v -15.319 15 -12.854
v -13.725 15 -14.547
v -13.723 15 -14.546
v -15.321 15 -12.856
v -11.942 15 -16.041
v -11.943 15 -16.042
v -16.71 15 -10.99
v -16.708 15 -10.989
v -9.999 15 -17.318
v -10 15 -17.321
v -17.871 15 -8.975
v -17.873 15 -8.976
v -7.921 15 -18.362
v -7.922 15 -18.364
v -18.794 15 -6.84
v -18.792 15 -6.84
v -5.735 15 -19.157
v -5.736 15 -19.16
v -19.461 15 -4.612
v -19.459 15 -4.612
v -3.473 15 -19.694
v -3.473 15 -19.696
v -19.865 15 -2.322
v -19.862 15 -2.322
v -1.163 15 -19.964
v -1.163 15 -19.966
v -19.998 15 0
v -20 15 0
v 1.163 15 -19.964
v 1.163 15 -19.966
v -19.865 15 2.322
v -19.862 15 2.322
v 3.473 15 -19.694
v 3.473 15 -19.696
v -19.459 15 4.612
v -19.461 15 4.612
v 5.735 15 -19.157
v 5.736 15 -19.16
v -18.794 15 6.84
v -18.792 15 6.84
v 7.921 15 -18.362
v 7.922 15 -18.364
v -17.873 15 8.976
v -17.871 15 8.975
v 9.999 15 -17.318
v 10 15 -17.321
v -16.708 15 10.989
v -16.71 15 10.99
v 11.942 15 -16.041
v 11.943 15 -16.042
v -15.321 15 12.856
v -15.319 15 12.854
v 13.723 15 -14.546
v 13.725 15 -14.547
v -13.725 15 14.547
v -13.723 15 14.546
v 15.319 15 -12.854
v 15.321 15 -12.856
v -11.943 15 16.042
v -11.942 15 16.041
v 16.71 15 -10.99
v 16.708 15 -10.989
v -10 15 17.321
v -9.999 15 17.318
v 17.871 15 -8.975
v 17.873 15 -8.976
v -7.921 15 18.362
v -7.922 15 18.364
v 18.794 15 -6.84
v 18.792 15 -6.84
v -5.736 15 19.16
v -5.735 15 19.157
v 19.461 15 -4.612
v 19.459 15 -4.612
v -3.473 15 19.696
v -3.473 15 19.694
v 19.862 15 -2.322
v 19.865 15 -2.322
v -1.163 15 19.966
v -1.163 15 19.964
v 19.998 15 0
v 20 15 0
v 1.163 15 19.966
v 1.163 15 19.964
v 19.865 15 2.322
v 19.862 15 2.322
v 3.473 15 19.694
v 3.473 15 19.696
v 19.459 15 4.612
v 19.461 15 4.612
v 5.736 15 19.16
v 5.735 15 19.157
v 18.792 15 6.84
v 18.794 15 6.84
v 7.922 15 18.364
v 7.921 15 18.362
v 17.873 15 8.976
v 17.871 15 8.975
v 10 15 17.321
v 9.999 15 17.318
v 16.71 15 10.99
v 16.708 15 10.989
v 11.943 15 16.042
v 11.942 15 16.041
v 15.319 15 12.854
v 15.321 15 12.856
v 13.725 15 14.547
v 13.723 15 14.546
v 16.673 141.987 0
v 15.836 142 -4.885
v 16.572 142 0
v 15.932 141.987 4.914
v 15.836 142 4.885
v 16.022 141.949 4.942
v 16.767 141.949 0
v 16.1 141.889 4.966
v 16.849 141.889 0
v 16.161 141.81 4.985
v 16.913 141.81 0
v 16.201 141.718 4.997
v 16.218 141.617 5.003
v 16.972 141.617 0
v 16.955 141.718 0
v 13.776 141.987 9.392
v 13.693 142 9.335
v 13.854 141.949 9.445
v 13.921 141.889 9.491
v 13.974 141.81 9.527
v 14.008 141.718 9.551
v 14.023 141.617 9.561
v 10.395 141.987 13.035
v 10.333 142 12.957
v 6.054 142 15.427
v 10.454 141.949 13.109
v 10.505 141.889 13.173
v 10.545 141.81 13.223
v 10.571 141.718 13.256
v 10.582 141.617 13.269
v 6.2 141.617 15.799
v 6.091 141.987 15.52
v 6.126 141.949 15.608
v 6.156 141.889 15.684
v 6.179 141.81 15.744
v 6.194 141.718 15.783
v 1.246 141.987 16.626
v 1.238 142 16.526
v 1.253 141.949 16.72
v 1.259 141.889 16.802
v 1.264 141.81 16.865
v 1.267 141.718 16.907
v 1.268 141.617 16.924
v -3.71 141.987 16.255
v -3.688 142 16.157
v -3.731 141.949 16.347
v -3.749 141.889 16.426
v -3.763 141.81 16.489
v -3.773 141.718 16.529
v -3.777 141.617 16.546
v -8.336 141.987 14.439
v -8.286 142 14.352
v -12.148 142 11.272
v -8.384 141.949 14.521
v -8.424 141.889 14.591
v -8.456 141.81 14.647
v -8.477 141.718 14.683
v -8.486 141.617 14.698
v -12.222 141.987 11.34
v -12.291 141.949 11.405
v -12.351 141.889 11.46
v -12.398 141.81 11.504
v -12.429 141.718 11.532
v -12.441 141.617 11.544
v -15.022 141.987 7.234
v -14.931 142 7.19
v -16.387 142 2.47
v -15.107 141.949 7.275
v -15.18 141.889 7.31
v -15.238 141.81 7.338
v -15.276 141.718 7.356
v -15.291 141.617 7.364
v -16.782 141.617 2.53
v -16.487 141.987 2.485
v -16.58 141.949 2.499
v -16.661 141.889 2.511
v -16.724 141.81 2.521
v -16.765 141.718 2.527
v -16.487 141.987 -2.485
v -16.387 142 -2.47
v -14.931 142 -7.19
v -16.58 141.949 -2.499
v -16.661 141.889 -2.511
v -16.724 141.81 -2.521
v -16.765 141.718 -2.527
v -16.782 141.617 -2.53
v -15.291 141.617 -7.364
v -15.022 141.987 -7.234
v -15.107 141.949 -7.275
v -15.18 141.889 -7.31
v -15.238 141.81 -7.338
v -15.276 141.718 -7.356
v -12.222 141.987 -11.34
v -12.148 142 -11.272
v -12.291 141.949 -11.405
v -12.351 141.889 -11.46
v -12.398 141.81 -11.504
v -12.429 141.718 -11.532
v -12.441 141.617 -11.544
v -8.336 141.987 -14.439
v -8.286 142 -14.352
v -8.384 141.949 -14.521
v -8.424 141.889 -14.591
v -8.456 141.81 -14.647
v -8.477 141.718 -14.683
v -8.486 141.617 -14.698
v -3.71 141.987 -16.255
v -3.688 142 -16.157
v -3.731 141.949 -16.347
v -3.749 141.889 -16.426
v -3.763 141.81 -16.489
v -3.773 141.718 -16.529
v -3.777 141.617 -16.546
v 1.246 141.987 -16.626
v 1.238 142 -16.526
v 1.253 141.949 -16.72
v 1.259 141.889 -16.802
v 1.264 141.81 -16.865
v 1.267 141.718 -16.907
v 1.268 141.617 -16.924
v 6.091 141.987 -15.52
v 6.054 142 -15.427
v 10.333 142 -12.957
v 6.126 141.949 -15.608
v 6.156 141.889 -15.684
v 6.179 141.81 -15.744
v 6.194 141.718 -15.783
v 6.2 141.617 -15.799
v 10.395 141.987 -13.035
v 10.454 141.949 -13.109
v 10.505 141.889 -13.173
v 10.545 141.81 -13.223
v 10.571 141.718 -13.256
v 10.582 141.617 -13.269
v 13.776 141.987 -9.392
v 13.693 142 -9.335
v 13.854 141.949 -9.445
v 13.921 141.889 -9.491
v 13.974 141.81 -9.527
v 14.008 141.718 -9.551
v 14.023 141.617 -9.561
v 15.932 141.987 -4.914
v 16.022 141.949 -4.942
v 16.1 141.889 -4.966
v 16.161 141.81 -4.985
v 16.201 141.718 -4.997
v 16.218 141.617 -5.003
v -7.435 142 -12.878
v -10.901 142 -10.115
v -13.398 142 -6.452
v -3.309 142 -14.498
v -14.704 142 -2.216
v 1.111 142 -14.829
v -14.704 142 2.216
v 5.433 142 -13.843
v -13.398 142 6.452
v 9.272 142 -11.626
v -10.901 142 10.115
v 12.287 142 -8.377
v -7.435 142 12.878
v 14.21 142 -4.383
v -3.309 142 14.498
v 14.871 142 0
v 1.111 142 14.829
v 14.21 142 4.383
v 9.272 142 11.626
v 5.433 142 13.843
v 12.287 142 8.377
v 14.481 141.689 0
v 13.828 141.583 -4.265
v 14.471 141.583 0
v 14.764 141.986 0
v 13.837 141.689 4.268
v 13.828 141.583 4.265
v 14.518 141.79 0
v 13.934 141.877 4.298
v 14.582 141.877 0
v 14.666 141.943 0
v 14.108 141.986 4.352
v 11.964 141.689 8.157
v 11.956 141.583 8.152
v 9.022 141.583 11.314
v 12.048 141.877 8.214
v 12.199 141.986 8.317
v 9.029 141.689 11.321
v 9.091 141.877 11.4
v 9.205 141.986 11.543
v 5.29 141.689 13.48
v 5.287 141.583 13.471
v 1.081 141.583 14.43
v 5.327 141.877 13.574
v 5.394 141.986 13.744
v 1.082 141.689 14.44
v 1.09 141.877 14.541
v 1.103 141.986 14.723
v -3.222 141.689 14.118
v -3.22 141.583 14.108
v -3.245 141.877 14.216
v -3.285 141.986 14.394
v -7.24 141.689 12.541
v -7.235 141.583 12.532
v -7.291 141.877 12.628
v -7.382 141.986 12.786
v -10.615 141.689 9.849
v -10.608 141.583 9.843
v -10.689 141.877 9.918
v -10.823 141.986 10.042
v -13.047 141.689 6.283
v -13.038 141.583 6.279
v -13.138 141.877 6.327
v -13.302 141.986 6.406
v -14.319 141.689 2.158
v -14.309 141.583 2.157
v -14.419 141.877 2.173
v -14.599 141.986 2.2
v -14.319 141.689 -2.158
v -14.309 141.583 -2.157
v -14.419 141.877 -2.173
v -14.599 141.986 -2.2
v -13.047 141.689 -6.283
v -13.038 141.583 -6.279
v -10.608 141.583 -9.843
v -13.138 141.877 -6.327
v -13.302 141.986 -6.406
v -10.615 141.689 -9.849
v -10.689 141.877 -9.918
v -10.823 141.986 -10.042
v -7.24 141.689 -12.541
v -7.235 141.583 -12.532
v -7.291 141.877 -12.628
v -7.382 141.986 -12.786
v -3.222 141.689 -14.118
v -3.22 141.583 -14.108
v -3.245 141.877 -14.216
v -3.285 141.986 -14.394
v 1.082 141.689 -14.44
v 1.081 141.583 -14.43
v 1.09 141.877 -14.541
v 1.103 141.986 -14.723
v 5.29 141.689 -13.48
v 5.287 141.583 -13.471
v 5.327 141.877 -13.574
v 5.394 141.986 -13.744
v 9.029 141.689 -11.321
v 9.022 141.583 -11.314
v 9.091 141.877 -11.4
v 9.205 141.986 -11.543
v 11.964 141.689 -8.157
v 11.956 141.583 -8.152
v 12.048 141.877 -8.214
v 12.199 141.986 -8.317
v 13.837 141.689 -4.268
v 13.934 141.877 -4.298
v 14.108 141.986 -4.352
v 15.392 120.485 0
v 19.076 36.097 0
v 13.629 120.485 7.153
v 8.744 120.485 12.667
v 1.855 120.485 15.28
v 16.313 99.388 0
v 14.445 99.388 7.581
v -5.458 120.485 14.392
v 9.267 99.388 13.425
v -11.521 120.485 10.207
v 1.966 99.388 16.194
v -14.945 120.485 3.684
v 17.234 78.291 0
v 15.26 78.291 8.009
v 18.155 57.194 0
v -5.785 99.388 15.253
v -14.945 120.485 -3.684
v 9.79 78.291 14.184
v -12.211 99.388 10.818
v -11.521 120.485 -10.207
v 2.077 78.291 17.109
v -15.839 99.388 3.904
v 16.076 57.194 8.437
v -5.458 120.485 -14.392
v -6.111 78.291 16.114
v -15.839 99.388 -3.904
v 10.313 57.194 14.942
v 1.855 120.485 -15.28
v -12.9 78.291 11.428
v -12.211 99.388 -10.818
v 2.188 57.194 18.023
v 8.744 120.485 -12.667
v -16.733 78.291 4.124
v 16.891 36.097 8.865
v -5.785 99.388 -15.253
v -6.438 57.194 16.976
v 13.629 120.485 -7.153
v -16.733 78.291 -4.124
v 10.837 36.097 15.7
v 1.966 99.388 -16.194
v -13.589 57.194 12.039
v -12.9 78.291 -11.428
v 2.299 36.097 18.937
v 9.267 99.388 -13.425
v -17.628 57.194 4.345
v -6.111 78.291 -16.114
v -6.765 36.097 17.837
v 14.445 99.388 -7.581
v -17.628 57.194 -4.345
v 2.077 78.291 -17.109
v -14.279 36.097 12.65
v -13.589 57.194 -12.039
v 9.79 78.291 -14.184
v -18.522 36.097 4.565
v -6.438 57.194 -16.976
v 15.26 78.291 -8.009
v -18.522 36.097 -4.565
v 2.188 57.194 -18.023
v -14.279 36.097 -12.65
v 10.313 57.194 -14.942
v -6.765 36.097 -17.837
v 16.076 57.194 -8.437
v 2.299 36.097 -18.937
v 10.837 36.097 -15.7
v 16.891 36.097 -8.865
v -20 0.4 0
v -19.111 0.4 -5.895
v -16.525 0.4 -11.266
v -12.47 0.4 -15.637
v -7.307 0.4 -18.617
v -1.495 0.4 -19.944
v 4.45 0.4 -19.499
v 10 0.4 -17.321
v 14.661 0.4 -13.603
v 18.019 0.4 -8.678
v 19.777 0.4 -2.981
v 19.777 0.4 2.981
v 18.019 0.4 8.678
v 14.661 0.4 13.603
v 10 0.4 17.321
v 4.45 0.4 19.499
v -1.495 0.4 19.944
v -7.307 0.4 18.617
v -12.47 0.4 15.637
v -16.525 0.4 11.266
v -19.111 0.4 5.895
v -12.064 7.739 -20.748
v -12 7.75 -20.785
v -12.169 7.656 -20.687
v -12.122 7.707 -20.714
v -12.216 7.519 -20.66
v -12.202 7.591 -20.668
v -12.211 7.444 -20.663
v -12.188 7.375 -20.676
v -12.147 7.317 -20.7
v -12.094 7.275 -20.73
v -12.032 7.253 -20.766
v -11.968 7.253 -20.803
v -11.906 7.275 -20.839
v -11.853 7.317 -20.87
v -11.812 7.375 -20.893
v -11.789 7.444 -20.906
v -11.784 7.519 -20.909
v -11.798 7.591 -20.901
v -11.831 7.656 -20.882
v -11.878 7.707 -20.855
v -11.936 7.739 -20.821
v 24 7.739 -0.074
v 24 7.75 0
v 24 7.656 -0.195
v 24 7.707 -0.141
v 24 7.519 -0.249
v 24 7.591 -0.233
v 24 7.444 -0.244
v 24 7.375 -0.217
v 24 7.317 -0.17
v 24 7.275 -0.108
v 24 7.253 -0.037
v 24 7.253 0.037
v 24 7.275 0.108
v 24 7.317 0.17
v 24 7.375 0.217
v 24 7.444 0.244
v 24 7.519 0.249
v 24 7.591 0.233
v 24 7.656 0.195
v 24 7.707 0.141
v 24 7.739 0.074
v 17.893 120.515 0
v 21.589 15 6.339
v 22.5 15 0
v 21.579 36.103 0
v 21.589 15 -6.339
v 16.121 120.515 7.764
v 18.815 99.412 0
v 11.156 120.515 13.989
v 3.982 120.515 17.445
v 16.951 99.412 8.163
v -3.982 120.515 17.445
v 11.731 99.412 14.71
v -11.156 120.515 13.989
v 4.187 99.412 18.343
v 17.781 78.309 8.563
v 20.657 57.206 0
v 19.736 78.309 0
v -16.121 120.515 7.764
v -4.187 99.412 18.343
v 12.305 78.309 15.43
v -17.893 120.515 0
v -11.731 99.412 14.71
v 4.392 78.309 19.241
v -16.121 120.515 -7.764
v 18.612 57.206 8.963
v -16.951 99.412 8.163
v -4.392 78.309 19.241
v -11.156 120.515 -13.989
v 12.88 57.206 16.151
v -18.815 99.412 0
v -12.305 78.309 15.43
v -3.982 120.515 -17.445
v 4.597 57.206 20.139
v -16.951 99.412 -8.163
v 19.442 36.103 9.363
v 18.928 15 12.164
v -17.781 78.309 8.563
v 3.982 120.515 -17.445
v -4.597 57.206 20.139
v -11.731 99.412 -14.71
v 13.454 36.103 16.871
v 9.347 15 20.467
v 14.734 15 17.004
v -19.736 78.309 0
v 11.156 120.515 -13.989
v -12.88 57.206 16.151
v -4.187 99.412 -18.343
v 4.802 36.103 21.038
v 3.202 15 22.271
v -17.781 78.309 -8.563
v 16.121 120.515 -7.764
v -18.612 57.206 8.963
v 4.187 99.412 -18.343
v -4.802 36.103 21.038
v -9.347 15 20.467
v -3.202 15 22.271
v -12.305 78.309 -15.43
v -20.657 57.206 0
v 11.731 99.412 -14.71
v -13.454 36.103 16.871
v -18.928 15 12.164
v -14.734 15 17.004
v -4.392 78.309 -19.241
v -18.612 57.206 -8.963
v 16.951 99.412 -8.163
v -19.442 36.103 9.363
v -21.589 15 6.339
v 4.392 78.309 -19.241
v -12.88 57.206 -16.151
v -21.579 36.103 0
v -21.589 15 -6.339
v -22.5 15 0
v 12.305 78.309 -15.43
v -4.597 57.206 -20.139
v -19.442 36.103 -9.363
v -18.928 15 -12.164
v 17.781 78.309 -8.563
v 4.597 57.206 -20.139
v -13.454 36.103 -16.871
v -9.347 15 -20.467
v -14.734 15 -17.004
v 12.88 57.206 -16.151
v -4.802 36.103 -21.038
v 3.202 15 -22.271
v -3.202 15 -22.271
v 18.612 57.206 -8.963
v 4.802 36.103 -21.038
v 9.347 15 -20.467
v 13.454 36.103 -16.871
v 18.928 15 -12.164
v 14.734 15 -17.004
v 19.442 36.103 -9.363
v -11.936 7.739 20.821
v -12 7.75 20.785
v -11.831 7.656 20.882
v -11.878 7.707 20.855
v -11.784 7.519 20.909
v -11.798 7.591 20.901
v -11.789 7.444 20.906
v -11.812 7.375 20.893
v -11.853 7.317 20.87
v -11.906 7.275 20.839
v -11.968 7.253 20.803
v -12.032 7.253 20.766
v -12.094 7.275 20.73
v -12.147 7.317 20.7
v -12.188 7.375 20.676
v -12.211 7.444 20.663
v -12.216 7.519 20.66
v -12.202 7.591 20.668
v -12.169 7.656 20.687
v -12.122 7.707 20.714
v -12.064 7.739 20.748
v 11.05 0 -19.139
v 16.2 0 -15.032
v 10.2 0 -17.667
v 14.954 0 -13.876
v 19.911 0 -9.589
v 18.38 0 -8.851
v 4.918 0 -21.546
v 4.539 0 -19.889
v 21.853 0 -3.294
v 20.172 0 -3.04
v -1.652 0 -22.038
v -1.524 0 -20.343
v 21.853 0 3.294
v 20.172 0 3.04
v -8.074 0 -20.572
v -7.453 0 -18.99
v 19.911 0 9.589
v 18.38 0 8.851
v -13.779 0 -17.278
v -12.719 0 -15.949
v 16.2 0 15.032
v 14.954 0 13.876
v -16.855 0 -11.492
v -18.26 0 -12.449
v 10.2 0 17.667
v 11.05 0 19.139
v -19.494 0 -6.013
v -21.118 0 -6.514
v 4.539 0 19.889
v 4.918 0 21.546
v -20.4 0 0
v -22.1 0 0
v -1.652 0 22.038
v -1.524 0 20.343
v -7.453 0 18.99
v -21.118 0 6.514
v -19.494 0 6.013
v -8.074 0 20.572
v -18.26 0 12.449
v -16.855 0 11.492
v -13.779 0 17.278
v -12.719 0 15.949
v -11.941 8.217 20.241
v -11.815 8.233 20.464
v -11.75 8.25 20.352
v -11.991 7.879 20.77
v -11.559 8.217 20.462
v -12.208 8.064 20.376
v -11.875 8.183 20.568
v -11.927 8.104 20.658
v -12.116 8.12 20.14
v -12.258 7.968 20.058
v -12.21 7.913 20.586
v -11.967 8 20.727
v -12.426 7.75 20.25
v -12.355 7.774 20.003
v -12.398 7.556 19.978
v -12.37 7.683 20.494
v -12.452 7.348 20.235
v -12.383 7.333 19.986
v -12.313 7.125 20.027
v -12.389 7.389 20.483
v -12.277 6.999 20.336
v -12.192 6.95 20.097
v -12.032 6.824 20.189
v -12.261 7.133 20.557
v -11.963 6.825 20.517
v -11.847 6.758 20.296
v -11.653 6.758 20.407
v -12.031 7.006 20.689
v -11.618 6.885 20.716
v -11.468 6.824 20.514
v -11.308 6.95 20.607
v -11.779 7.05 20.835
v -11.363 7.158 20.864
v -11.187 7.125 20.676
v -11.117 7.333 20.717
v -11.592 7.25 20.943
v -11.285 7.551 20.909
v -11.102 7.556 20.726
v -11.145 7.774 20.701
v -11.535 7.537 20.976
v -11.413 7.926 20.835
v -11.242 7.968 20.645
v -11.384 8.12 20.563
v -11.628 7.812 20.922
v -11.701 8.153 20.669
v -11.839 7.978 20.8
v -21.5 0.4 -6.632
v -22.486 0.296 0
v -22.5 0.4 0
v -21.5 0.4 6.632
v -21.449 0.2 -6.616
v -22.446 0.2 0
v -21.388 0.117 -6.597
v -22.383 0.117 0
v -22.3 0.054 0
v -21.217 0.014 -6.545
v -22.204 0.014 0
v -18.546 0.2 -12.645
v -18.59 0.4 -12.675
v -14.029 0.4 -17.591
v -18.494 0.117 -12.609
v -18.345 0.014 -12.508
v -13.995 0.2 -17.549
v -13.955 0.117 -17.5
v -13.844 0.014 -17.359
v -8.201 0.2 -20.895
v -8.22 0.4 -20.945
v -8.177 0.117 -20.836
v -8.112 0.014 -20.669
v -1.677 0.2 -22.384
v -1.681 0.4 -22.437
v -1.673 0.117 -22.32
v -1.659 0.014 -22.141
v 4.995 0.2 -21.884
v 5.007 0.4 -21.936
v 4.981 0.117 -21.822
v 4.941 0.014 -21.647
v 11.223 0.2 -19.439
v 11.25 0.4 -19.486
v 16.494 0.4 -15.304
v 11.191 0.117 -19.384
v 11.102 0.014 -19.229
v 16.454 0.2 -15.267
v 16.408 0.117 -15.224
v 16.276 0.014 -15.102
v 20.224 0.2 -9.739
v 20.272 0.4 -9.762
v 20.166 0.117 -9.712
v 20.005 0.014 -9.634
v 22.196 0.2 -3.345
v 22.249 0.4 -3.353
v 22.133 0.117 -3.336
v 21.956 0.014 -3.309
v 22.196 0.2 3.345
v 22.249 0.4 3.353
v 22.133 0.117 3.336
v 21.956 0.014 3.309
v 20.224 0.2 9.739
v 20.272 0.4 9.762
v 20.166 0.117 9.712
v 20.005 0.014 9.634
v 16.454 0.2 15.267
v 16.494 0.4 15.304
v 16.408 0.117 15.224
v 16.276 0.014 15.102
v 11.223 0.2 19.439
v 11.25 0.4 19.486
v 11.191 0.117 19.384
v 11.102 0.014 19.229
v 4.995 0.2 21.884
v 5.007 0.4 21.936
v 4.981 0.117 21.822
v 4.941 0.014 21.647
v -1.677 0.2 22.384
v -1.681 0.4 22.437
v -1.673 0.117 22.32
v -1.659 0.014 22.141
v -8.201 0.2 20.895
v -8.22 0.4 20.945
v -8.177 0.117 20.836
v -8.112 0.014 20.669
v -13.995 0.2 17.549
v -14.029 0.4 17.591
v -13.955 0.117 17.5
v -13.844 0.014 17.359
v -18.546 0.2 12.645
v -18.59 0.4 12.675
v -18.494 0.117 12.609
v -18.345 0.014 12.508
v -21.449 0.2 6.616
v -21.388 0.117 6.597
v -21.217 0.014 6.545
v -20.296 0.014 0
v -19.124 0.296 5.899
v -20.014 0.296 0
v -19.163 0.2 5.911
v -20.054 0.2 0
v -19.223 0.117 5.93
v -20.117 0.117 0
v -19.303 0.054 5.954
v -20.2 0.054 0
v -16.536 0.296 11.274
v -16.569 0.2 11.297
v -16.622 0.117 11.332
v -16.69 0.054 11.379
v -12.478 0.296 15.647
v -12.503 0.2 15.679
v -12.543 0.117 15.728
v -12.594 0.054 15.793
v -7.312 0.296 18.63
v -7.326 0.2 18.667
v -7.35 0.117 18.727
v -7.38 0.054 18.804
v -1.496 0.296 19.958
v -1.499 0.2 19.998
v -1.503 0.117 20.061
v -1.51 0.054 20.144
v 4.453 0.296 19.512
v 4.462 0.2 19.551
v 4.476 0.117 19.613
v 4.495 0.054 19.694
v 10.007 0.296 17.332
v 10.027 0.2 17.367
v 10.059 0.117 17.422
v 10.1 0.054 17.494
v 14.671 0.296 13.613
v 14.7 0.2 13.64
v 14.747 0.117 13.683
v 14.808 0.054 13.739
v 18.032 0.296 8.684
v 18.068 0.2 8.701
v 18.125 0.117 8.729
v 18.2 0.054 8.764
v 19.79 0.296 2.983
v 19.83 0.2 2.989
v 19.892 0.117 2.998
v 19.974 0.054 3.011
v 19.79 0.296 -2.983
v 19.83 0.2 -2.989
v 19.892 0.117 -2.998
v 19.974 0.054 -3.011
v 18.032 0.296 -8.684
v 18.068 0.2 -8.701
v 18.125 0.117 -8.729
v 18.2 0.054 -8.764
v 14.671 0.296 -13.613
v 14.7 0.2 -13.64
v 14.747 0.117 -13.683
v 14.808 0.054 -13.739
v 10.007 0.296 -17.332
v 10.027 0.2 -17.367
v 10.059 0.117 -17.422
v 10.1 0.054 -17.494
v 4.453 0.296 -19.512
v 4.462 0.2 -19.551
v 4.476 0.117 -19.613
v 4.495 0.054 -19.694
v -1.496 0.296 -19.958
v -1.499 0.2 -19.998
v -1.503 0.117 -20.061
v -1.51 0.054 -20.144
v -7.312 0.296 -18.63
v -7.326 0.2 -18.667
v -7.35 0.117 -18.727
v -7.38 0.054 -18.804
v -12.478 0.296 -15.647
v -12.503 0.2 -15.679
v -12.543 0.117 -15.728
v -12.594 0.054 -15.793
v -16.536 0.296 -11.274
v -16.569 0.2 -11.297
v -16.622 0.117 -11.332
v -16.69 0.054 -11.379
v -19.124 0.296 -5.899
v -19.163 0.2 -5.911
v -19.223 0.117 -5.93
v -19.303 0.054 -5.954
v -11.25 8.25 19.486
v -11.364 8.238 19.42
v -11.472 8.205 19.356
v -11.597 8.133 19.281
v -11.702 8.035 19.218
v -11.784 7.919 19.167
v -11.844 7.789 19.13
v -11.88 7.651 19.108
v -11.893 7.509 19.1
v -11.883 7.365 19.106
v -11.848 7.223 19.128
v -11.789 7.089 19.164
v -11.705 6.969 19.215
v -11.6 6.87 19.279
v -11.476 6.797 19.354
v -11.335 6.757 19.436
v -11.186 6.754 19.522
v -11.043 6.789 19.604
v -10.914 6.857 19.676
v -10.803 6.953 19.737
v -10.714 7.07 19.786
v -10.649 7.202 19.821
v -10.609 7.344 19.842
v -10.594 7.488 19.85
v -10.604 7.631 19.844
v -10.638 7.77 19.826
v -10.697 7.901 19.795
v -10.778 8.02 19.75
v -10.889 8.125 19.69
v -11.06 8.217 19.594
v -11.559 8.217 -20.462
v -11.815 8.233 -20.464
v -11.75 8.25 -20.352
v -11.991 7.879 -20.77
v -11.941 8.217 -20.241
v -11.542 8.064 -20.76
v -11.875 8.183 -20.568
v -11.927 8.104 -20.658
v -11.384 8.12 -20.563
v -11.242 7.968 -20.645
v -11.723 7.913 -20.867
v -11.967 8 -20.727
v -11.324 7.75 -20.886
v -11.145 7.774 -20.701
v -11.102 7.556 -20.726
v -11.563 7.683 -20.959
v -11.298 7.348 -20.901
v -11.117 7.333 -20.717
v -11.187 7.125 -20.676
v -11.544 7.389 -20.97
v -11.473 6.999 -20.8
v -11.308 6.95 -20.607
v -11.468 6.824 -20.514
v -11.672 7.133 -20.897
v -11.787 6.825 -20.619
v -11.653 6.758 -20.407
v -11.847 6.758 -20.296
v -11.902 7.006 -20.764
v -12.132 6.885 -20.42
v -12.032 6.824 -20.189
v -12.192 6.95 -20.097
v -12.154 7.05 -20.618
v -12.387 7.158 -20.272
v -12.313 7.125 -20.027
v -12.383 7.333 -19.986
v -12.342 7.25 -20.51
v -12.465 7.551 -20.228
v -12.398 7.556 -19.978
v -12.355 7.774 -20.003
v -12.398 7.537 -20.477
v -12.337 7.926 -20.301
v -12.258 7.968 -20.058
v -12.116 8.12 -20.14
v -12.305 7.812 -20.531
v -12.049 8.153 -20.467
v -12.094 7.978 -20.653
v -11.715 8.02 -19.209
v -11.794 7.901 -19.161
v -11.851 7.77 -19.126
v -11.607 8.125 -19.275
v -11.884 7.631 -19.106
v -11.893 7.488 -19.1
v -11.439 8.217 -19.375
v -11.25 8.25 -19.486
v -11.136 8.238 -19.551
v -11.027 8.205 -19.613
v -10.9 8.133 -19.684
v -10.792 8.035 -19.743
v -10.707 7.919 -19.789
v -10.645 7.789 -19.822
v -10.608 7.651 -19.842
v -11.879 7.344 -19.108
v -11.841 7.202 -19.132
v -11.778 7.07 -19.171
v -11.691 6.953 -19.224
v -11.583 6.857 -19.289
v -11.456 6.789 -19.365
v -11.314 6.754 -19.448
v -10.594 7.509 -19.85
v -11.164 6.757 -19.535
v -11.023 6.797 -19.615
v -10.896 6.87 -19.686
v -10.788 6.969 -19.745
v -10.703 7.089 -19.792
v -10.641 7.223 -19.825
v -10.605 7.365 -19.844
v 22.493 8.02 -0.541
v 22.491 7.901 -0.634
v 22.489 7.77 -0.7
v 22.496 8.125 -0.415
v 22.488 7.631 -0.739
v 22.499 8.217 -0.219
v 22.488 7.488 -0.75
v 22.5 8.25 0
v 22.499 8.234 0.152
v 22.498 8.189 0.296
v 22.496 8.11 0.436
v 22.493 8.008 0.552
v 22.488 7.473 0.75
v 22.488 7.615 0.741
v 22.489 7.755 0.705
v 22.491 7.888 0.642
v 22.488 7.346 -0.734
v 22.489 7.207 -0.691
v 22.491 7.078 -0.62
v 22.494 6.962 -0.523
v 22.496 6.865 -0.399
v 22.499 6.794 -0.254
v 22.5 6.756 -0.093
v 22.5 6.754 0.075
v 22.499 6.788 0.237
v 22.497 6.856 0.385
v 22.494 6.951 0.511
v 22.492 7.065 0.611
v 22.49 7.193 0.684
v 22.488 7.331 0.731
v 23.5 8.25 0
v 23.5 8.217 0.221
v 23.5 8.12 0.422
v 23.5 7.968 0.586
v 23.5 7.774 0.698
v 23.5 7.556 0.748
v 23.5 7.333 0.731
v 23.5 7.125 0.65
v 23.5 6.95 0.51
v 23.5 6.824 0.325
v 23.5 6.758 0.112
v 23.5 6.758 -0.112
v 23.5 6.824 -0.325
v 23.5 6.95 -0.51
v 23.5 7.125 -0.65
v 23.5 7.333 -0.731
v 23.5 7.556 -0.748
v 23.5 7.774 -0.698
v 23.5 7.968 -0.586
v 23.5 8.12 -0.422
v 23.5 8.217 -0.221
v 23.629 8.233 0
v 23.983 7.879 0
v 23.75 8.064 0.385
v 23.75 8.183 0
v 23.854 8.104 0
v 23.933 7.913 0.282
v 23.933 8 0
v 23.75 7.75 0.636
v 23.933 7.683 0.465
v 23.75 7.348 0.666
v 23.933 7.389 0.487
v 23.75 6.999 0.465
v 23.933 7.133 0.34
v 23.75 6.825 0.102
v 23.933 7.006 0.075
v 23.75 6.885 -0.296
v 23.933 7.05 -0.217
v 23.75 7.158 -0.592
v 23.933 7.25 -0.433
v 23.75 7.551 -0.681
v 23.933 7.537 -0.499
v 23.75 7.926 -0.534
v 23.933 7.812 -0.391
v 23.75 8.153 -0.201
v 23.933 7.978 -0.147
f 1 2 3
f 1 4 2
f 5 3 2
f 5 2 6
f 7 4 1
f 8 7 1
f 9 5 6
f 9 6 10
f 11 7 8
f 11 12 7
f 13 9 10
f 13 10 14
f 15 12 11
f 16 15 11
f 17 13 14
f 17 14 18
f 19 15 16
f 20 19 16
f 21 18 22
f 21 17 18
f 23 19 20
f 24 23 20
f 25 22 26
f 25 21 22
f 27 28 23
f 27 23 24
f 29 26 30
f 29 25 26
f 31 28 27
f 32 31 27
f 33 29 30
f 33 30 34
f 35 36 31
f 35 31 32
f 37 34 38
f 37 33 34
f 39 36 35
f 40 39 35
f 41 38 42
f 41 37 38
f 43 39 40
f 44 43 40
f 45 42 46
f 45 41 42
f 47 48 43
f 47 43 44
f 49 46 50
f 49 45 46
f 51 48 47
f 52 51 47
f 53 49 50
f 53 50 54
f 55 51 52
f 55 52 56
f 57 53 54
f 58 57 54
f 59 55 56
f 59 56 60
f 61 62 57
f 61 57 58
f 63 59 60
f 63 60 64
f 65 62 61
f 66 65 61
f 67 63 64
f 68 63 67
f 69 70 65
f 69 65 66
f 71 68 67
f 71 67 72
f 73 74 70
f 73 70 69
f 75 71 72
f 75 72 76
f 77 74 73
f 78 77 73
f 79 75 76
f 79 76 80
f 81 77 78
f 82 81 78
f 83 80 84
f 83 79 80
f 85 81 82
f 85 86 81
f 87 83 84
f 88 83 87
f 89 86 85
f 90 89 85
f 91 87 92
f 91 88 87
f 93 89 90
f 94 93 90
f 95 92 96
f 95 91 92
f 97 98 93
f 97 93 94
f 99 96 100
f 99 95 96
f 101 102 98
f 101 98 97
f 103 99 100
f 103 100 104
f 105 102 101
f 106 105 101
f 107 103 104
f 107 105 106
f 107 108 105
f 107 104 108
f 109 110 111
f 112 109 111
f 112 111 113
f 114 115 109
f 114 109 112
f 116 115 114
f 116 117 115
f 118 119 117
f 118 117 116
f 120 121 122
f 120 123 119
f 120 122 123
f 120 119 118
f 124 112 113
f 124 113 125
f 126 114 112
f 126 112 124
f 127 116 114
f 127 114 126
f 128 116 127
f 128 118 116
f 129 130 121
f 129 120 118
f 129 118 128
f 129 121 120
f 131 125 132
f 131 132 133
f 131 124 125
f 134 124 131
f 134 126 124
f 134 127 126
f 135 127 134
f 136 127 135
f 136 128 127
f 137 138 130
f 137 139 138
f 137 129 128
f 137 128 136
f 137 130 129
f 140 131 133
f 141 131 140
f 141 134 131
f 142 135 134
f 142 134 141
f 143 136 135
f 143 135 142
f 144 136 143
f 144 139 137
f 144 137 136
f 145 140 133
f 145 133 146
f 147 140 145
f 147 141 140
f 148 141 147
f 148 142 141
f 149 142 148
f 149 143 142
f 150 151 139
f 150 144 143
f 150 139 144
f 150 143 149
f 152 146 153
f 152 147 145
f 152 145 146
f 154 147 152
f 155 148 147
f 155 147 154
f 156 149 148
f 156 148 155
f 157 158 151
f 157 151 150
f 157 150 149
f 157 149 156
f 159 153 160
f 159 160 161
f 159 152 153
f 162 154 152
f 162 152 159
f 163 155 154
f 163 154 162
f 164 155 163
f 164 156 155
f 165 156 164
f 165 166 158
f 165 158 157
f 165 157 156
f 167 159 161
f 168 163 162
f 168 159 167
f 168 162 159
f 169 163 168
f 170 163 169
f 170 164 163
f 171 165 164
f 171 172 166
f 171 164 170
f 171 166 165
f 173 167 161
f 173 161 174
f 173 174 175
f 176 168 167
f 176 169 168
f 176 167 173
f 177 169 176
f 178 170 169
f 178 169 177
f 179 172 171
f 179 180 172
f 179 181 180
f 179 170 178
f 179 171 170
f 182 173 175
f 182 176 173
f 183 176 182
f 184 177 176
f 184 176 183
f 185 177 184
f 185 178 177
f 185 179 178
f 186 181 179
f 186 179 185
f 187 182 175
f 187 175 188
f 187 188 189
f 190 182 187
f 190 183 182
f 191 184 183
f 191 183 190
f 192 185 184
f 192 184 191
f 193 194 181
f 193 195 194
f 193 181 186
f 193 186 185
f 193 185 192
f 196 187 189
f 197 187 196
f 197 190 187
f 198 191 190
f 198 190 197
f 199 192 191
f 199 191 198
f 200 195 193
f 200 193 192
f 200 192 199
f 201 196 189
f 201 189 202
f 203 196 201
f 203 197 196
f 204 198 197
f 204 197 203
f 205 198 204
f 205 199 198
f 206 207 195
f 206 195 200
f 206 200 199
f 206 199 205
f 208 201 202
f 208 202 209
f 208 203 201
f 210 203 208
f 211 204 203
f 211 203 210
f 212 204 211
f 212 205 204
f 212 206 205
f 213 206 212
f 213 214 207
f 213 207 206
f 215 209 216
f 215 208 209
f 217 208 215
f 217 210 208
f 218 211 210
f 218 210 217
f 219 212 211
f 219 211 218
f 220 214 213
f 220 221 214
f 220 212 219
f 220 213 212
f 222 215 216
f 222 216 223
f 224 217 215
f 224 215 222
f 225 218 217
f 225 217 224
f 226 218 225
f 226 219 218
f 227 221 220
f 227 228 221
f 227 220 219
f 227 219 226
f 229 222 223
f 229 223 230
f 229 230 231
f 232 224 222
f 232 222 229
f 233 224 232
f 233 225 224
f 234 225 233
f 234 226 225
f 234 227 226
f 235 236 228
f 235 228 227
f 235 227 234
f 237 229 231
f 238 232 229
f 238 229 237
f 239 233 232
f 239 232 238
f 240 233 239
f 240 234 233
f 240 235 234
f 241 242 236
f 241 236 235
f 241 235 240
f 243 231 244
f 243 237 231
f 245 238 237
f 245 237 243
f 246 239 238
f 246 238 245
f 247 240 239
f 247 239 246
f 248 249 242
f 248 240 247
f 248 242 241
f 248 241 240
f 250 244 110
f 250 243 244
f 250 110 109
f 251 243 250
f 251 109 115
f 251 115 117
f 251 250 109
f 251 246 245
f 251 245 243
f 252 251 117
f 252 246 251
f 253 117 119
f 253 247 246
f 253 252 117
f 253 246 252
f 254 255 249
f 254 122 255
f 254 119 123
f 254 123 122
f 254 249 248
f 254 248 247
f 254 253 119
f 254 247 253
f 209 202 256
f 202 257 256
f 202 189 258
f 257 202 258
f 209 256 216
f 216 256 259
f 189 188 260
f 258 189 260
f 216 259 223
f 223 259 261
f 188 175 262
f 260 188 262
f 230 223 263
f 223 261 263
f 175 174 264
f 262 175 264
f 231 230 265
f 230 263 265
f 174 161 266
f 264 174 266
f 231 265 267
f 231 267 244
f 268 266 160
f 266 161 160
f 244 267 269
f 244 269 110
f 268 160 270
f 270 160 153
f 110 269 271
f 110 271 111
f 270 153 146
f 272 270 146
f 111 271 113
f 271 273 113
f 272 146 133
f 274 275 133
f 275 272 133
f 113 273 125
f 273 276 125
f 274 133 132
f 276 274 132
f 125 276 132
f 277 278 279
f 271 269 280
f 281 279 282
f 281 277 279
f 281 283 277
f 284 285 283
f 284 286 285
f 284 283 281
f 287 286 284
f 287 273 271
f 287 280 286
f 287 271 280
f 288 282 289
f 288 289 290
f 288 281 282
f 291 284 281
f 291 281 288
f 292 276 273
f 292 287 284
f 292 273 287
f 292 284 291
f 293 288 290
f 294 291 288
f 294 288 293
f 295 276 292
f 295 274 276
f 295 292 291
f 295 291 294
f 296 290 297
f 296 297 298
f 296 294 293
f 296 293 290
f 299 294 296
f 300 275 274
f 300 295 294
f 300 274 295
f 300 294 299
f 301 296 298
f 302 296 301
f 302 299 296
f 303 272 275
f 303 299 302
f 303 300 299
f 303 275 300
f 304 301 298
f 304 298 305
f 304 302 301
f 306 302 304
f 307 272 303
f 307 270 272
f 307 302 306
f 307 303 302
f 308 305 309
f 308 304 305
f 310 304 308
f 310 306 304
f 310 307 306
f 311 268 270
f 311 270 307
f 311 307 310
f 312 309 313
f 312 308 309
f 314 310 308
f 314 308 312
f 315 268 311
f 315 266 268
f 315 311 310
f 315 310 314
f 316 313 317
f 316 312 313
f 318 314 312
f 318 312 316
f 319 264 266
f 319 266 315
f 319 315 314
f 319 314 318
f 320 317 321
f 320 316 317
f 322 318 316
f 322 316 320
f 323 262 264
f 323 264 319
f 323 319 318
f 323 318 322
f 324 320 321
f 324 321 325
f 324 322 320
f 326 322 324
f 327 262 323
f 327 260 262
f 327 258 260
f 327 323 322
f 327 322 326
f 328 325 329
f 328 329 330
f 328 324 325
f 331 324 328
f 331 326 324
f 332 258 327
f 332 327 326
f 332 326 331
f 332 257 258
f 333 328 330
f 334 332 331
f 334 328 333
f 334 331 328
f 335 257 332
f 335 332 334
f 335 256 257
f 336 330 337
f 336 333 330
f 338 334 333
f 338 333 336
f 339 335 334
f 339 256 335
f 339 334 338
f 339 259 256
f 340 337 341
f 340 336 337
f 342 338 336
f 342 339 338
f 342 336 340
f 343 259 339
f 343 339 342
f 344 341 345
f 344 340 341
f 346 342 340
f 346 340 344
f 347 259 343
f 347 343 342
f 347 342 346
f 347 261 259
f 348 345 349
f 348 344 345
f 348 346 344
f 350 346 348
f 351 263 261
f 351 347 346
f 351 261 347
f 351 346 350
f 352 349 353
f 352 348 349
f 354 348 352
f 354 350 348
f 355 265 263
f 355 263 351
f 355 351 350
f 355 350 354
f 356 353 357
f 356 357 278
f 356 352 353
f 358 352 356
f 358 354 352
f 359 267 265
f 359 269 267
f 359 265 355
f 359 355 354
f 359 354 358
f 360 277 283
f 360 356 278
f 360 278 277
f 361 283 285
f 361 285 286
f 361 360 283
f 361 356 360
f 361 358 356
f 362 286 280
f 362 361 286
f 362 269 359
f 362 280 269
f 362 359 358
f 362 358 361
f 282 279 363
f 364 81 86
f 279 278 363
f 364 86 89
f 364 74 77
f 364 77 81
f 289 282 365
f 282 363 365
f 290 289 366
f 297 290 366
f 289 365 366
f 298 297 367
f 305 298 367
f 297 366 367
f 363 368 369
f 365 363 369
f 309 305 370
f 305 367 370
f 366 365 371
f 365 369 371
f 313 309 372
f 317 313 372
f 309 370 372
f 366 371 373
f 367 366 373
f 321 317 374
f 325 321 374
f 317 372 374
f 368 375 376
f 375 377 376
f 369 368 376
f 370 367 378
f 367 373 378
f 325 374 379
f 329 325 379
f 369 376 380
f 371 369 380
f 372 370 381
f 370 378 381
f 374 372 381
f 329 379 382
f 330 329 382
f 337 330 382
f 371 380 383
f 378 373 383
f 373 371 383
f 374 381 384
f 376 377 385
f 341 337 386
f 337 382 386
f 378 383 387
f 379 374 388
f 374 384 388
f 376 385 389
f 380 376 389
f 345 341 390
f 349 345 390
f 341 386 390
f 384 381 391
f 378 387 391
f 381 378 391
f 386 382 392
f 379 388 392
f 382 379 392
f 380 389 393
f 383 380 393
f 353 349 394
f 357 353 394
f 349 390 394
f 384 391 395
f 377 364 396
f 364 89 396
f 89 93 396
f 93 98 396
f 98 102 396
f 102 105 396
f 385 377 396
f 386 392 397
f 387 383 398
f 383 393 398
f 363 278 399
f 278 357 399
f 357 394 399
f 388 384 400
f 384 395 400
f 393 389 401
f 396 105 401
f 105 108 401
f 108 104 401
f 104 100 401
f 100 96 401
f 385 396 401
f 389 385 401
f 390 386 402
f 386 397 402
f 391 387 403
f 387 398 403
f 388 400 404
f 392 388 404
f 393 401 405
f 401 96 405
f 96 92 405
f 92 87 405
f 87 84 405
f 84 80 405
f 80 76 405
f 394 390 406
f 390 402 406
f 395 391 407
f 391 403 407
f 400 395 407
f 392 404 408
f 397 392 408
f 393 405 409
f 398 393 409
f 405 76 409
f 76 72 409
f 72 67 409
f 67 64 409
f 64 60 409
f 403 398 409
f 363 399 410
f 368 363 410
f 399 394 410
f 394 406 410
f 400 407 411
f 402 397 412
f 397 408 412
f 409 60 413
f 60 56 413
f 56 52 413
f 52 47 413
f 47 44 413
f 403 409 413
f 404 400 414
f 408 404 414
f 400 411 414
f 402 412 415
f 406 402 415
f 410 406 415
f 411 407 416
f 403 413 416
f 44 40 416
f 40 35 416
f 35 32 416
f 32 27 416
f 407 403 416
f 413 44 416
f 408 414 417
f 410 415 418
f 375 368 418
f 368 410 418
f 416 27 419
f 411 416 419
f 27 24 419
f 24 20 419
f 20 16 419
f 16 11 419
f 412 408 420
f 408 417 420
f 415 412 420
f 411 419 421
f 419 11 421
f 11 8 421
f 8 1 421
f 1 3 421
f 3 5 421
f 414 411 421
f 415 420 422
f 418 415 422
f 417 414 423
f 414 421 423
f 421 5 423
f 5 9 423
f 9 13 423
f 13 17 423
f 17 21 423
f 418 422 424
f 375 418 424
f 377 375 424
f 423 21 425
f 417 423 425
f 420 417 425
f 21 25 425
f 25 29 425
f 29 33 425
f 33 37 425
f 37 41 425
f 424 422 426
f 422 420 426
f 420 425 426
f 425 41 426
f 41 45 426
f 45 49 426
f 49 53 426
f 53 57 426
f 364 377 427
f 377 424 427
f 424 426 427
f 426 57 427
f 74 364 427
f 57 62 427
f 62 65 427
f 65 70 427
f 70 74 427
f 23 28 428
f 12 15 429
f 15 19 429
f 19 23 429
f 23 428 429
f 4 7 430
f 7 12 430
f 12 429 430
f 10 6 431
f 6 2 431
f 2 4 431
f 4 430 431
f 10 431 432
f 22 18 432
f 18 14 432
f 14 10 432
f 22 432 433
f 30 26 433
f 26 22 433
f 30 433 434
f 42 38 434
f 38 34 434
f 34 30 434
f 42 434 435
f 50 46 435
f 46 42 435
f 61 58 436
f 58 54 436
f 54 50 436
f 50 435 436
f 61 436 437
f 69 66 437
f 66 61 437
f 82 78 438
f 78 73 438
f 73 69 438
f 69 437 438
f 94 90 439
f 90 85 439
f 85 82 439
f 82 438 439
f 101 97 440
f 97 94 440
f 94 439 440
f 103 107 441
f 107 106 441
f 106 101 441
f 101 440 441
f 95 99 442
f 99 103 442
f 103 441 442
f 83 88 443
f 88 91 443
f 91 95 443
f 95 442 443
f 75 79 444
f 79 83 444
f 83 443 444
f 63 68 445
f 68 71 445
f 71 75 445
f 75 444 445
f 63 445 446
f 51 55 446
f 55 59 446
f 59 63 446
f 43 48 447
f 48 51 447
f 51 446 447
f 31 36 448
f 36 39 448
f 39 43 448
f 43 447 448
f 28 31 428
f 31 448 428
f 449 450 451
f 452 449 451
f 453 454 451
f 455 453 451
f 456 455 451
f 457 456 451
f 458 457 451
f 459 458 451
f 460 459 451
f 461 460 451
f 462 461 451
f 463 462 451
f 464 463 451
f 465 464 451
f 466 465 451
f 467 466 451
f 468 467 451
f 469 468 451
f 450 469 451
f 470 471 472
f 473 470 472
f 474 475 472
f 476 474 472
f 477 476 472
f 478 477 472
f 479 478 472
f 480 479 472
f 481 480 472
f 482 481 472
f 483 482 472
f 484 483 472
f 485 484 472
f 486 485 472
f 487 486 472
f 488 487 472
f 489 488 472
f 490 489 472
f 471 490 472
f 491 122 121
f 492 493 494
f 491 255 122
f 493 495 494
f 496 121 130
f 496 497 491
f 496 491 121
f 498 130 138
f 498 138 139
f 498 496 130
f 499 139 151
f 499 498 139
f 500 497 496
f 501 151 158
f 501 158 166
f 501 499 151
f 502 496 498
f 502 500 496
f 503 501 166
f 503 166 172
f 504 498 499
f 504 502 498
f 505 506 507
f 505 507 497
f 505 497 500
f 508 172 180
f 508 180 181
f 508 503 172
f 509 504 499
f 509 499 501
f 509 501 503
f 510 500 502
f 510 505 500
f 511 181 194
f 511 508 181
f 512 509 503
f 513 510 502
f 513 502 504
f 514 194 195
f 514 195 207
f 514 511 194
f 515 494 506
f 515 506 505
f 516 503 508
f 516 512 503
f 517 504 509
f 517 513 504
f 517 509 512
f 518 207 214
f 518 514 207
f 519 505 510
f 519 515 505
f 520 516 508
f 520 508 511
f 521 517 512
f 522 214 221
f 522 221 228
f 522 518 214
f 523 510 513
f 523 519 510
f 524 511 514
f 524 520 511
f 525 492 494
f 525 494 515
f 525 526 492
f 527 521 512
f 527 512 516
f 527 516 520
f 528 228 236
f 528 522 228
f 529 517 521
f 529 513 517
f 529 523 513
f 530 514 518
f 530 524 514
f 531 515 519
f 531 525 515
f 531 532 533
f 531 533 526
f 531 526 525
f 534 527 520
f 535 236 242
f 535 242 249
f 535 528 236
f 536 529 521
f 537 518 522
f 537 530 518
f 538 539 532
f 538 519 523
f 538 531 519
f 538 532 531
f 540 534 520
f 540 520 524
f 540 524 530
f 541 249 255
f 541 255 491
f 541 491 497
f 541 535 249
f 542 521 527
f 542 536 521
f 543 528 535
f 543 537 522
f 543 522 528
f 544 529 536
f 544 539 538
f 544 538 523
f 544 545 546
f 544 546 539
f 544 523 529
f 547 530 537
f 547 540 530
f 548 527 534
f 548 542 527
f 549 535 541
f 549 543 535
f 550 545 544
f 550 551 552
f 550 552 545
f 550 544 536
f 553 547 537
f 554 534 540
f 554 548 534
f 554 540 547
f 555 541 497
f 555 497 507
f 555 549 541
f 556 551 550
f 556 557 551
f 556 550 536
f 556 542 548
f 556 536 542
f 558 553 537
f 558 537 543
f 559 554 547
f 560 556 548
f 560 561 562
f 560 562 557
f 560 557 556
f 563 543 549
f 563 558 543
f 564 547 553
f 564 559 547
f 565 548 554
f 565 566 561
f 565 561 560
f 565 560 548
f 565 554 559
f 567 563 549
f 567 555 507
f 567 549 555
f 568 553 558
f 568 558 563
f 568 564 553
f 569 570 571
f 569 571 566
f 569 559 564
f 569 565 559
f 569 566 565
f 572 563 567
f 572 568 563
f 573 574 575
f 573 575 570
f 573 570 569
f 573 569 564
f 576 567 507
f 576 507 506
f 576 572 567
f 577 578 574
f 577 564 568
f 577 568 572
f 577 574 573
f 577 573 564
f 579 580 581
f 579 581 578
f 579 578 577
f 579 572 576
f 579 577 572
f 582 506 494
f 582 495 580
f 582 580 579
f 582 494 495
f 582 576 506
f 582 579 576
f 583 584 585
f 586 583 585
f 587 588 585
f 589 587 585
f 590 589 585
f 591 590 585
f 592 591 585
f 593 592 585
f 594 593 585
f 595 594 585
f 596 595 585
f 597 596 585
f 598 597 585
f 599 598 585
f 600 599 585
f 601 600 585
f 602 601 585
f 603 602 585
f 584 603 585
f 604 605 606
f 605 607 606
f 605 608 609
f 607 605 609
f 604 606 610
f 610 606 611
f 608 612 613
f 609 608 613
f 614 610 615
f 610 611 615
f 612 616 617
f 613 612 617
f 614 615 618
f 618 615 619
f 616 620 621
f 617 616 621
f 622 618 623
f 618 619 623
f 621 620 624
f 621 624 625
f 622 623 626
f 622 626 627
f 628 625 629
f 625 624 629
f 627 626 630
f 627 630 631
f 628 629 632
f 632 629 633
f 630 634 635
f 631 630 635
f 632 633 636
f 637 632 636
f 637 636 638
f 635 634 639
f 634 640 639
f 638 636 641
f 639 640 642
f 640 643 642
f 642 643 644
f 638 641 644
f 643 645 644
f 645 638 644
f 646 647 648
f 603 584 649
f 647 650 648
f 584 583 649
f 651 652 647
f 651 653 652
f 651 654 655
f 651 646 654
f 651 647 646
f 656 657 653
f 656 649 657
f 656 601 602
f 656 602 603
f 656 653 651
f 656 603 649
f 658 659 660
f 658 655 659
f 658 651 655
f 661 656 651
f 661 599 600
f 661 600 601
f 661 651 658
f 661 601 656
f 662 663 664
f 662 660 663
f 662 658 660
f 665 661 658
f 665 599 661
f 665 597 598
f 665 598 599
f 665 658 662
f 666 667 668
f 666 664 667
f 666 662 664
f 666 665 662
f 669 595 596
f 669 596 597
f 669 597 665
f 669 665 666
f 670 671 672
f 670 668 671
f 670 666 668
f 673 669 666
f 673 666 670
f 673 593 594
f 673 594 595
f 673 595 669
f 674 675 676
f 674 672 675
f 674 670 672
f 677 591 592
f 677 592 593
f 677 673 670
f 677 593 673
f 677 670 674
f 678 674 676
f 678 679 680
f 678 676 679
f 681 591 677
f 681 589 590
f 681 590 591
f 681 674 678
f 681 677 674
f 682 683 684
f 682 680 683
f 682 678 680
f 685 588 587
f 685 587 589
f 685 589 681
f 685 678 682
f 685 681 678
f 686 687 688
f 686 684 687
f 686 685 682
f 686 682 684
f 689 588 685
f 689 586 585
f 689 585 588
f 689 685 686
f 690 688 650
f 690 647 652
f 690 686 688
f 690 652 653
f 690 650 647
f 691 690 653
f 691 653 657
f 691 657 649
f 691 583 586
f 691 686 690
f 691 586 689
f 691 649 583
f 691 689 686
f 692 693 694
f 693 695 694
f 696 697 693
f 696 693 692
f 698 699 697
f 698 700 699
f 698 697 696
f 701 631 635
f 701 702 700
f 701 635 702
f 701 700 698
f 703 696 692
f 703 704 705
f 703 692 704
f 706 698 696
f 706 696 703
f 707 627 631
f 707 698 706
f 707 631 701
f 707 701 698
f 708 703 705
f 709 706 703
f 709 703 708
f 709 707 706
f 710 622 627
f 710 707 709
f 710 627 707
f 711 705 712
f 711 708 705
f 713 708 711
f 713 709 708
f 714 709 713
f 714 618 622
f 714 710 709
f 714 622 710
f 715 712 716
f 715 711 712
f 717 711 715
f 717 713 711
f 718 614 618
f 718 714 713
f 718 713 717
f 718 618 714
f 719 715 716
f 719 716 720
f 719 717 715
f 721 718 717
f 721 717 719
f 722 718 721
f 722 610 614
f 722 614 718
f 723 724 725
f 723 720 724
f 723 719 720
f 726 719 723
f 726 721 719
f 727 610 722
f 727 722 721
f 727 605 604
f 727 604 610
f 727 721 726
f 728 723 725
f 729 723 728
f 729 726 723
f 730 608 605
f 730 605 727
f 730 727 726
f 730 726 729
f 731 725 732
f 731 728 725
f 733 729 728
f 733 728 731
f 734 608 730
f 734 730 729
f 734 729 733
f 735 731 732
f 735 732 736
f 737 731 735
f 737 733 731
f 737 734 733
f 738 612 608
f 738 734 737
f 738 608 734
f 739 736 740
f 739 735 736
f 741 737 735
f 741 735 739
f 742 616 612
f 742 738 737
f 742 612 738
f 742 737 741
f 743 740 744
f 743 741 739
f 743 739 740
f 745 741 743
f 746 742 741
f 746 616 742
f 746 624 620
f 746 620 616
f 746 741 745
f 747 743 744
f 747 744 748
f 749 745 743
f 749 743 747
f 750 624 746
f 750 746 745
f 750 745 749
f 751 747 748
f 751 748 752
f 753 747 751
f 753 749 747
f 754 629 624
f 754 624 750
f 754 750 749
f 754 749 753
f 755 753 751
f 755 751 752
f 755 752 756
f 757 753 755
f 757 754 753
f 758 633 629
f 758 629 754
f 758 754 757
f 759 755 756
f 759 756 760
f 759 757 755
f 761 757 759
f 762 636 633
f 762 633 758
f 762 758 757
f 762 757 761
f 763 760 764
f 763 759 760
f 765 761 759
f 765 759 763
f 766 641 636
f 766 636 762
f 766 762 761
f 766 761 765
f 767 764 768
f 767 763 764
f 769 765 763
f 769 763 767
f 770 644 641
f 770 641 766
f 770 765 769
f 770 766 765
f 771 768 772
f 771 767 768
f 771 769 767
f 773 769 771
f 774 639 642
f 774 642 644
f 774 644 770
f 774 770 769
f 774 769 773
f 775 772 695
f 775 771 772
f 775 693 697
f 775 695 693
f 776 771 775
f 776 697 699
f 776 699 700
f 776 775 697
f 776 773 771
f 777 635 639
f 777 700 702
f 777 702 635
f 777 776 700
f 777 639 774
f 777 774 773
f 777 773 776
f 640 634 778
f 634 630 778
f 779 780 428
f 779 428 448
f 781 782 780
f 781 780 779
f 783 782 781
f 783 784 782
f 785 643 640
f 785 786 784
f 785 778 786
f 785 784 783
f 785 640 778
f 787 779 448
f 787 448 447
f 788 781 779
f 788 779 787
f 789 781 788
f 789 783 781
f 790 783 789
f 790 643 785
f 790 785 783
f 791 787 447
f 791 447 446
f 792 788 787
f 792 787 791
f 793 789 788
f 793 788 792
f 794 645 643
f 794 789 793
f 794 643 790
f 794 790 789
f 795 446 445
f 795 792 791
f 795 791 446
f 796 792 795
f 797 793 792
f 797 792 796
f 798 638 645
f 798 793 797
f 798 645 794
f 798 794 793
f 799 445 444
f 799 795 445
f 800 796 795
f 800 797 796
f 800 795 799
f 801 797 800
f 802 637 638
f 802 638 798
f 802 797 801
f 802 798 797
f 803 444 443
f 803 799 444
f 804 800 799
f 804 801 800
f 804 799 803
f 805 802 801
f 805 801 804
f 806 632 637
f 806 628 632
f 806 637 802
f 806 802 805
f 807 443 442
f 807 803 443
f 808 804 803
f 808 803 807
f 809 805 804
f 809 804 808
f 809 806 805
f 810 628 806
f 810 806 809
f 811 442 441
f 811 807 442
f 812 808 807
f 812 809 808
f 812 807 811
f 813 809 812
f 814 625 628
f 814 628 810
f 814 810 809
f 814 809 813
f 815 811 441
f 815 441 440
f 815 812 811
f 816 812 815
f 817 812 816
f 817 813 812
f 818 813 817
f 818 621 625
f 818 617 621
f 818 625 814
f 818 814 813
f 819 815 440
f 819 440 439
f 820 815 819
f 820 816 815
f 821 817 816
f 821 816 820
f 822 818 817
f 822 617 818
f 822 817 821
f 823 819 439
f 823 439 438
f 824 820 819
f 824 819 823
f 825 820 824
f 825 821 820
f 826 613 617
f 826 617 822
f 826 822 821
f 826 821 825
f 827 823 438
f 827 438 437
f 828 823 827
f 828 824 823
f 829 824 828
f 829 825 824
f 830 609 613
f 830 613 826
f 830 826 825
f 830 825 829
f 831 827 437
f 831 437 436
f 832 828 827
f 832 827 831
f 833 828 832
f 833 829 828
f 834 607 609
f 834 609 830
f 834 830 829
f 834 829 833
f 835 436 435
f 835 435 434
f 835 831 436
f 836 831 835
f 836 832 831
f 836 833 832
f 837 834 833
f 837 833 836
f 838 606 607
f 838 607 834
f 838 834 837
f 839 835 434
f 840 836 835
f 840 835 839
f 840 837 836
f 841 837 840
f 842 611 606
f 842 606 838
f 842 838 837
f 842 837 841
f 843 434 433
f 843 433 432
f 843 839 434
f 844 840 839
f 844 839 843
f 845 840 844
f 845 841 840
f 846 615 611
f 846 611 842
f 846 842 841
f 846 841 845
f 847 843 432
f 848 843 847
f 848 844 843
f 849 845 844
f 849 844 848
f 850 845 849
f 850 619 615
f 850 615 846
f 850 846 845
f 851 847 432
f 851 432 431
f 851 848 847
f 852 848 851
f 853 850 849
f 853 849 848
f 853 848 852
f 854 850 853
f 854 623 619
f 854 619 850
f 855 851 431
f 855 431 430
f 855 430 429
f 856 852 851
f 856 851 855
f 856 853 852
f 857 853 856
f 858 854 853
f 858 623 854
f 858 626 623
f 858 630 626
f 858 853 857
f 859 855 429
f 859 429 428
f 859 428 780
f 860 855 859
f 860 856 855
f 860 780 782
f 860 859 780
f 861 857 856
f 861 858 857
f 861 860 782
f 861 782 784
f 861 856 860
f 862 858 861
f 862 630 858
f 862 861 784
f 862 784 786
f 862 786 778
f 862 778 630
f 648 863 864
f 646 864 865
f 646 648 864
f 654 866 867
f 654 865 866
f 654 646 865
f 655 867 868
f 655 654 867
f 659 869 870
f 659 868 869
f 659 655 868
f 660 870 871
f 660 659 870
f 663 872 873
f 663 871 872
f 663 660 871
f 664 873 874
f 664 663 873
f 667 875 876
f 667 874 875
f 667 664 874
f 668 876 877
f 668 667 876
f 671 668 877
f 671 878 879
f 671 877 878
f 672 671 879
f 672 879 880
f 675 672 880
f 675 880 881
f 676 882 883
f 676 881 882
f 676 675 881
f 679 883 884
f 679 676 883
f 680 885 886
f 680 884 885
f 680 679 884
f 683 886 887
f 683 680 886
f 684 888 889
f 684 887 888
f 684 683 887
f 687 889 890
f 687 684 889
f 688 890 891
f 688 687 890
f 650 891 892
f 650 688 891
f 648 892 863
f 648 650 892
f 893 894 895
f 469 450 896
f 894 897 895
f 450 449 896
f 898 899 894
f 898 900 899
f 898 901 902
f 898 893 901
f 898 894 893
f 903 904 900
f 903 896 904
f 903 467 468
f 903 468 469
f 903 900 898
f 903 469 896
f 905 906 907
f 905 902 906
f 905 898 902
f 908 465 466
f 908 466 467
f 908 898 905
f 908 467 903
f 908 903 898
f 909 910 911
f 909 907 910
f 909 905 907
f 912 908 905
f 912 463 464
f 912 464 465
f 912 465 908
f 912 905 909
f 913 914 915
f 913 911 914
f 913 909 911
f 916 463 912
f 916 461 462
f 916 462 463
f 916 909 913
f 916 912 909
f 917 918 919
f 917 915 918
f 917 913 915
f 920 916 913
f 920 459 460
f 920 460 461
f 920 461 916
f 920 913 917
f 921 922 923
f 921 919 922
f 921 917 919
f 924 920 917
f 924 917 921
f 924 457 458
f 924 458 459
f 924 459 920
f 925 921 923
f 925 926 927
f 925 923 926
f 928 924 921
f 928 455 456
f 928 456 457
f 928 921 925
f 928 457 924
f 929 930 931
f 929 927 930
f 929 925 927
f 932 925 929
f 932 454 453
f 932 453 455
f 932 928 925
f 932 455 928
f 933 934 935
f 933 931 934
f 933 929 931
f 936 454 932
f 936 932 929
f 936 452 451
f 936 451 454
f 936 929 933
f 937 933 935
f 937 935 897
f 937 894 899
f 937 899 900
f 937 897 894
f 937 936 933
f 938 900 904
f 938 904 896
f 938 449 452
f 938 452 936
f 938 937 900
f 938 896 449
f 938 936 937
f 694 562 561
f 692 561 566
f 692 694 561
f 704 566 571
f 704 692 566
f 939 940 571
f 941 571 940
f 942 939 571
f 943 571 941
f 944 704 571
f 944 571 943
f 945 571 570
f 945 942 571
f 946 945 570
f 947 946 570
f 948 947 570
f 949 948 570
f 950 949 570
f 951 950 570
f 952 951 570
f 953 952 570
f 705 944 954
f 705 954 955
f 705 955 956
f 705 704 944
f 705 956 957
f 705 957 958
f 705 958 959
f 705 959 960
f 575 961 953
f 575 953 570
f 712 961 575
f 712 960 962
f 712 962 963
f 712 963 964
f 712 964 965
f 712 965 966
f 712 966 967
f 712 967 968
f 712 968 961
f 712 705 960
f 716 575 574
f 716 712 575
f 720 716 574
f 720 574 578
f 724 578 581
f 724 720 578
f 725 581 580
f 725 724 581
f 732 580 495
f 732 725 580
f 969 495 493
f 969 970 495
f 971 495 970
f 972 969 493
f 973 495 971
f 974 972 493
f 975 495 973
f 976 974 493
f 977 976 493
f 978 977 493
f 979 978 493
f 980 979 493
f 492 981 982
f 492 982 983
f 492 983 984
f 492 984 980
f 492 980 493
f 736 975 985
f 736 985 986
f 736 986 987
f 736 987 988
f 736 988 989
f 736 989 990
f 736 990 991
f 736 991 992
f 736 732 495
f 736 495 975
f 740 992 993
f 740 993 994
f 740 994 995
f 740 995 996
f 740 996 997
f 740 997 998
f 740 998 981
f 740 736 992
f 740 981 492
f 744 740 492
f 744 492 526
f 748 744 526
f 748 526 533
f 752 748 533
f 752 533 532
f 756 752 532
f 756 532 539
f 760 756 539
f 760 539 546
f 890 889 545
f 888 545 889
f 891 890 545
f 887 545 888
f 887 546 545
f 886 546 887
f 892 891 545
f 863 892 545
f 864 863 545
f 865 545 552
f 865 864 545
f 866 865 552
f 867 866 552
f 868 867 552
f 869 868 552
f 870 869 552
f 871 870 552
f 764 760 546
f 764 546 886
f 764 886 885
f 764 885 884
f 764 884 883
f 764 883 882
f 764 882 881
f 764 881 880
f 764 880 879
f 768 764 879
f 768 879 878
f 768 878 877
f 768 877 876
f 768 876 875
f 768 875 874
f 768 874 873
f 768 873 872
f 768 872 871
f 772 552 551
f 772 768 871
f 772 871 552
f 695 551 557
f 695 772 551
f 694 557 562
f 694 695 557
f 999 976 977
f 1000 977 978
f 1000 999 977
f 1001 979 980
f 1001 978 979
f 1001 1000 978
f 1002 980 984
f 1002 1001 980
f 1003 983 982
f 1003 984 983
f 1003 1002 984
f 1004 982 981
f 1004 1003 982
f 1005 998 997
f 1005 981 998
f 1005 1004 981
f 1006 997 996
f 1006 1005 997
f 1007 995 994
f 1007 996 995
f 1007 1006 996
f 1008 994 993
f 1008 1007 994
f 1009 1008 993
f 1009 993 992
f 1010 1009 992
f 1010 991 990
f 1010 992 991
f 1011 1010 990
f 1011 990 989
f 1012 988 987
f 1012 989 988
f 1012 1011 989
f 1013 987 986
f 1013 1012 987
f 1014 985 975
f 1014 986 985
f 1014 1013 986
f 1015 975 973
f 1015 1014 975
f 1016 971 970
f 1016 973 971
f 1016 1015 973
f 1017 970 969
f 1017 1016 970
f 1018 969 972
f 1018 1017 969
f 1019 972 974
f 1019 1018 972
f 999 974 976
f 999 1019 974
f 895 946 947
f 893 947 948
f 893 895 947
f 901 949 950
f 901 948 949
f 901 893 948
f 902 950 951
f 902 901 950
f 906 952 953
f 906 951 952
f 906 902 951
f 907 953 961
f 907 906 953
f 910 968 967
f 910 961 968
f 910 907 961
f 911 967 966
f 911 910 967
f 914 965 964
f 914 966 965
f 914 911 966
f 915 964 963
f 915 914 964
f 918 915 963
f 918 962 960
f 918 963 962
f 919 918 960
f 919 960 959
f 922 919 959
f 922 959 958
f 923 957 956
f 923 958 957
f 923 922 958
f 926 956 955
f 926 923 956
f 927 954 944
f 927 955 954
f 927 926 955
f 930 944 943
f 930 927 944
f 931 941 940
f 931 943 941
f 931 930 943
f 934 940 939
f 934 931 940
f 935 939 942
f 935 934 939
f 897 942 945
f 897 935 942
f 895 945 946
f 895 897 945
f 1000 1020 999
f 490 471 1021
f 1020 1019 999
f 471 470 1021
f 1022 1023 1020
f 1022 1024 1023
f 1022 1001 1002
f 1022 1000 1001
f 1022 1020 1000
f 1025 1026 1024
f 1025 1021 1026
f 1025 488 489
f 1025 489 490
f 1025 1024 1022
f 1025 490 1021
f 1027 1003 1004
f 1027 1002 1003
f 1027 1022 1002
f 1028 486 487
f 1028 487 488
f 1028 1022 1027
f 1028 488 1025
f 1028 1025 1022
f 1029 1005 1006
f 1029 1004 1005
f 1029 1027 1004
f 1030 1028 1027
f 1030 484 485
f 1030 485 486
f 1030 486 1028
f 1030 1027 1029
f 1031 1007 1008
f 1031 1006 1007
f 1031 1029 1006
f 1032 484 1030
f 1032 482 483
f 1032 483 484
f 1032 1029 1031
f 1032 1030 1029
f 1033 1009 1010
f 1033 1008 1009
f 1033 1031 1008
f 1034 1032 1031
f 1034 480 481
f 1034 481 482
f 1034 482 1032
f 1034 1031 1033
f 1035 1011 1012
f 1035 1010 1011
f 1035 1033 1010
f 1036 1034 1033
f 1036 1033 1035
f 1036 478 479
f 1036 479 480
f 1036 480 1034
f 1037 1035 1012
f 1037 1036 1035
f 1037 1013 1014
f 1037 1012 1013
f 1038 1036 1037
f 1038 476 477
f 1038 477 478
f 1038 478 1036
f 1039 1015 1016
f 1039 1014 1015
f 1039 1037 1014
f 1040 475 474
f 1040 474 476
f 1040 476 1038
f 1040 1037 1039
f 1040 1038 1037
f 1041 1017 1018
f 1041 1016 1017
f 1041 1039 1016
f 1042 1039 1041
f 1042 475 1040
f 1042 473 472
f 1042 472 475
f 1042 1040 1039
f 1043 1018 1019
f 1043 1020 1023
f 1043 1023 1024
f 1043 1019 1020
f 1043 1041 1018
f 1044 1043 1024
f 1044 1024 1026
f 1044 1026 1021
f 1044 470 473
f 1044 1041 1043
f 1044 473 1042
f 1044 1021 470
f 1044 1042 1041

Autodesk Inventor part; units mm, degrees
ref_plane "YZ Plane" through (0, 0, 0) normal (1, 0, 0) x (0, 1, 0)
ref_plane "XZ Plane" through (0, 0, 0) normal (0, 1, 0) x (-1, 0, 0)
ref_plane "XY Plane" through (0, 0, 0) normal (0, 0, 1) x (1, 0, 0)
sketch "Base Profile" plane through (0, 0, 0) normal (0, 1, 0) x (-1, 0, 0)
  circle A0 centre (0, 0) radius 22.5
  circle A1 centre (0, 0) radius 20
  dimension "d55" = 45
  dimension "d56" = 40
extrude "Bayonet Mounting" add sketch "Base Profile" along normal blind 15
sketch "Sketch4" plane through (0, 0, 0) normal (0, 0, 1) x (1, 0, 0)
  line L0 (0, 0) -> (0, 15)
  line L1 (0, 15) -> (22.5, 15)
  line L2 (0, 0) -> (22.5, 0)
  line L3 (22.5, 15) -> (22.5, 0)
  line L4 (21, 8.25) -> (24, 8.25)
  line L5 (24, 8.25) -> (24, 6.75)
  line L6 (24, 6.75) -> (21, 6.75)
  line L7 (21, 6.75) -> (21, 8.25)
  line L8 (21, 8.25) -> (24, 6.75) construction
  line L9 (24, 8.25) -> (21, 6.75) construction
  line L10 (24, 7.5) -> (21, 7.5)
  line L11 (22.5, 15) -> (16.9551, 142)
  line L12 (16.9551, 142) -> (0, 142)
  line L13 (0, 142) -> (0, 15)
  line L14 (14.4527, 142) -> (19.9976, 15)
  point P0 (22.5, 7.5)
  dimension "d59" = 15
  dimension "d60" = 45
  dimension "d106" = 1.5
  dimension "d107" = 1.5
  dimension "d113" = 127
  dimension "d114" = 87.5
  dimension "d115" = 2.5
revolve "Lug" add sketch "Sketch4" angle 360 about axis through (24, 7.5, 0) along (-1, 0, 0) contours L10 L7 L4 L3 | L3 L4 L5 L10
fillet "Lug Fillet" radius 0.5 1 edges at (24, 6.75, 0)
pattern_circular "Lugs" count 3 over 360 about axis through (0, -10, 0) along (0, 1, 0) of "Lug", "Lug Fillet"
revolve "Revolution5" add sketch "Sketch4" angle 360 about axis through (0, 142, 0) along (0, -1, 0) contours L14 L12 L11 L1
fillet "Fillet7" radius 0.4 4 edges at (22.5, 0, 0) (20, 0, 0) (-14.4527, 142, 0) (-16.9551, 142, 0)
equation "\"d106\" = lugThickness"
equation "\"d107\" = lugThickness"
equation "\"lugThickness\" = 1.5"
properties part number "Tapered Vac Fitting" material "PVC, Unplasticized"
